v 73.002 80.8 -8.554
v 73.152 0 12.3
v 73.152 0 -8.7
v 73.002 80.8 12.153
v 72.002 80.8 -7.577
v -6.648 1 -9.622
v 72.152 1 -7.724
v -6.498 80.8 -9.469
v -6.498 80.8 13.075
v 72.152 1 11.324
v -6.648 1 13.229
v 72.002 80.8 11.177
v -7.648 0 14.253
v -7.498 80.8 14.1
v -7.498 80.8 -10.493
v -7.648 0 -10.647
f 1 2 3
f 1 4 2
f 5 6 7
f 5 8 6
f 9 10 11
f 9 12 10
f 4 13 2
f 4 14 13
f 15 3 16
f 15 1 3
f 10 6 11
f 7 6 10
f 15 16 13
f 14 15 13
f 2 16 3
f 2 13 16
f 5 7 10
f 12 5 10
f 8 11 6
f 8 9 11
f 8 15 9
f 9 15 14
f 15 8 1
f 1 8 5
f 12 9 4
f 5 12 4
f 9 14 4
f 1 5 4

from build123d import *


with BuildPart() as part:
    # Bottom → Magazine Body section 0
    with BuildSketch(Plane(origin=(0, 0, 0), x_dir=(1, 0, 0), z_dir=(0, 1, 0))):
        with BuildLine():
            Line((-7.648338397, 10.646601169), (-7.648338397, -14.253398831))
            Line((-7.648338397, -14.253398831), (73.151661603, -12.299887169))
            Line((73.151661603, -12.299887169), (73.151661603, 8.700112831))
            Line((73.151661603, 8.700112831), (-7.648338397, 10.646601169))
        make_face()
    # Top → Magazine Body section 1
    with BuildSketch(Plane(origin=(0, 80.8, 0), x_dir=(1, 0, 0), z_dir=(0, 1, 0))):
        with BuildLine():
            Line((73.001661603, -12.153469905), (73.001661603, 8.553682842))
            Line((73.001661603, 8.553682842), (-7.498338397, 10.49294412))
            Line((-7.498338397, 10.49294412), (-7.498338397, -14.099728429))
            Line((-7.498338397, -14.099728429), (73.001661603, -12.153469905))
        make_face()
    loft()

    # Sketch4 → Magazine Inner Cut section 0
    with BuildSketch(Plane(origin=(0, 1, 0), x_dir=(-1, 0, 0), z_dir=(0, -1, 0))):
        with BuildLine():
            Line((6.648338397, -13.228929483), (6.648338397, 9.62222084))
            Line((6.648338397, 9.62222084), (-72.151661603, 7.723912906))
            Line((-72.151661603, 7.723912906), (-72.151661603, -11.32377207))
            Line((-72.151661603, -11.32377207), (6.648338397, -13.228929483))
        make_face()
    # Sketch5 → Magazine Inner Cut section 1
    with BuildSketch(Plane(origin=(0, 80.8, 0), x_dir=(1, 0, 0), z_dir=(0, 1, 0))):
        with BuildLine():
            Line((72.001661603, -11.177354805), (72.001661603, 7.577482917))
            Line((72.001661603, 7.577482917), (-6.498338397, 9.468563791))
            Line((-6.498338397, 9.468563791), (-6.498338397, -13.07525908))
            Line((-6.498338397, -13.07525908), (72.001661603, -11.177354805))
        make_face()
    loft(mode=Mode.SUBTRACT)


solid = part.part
